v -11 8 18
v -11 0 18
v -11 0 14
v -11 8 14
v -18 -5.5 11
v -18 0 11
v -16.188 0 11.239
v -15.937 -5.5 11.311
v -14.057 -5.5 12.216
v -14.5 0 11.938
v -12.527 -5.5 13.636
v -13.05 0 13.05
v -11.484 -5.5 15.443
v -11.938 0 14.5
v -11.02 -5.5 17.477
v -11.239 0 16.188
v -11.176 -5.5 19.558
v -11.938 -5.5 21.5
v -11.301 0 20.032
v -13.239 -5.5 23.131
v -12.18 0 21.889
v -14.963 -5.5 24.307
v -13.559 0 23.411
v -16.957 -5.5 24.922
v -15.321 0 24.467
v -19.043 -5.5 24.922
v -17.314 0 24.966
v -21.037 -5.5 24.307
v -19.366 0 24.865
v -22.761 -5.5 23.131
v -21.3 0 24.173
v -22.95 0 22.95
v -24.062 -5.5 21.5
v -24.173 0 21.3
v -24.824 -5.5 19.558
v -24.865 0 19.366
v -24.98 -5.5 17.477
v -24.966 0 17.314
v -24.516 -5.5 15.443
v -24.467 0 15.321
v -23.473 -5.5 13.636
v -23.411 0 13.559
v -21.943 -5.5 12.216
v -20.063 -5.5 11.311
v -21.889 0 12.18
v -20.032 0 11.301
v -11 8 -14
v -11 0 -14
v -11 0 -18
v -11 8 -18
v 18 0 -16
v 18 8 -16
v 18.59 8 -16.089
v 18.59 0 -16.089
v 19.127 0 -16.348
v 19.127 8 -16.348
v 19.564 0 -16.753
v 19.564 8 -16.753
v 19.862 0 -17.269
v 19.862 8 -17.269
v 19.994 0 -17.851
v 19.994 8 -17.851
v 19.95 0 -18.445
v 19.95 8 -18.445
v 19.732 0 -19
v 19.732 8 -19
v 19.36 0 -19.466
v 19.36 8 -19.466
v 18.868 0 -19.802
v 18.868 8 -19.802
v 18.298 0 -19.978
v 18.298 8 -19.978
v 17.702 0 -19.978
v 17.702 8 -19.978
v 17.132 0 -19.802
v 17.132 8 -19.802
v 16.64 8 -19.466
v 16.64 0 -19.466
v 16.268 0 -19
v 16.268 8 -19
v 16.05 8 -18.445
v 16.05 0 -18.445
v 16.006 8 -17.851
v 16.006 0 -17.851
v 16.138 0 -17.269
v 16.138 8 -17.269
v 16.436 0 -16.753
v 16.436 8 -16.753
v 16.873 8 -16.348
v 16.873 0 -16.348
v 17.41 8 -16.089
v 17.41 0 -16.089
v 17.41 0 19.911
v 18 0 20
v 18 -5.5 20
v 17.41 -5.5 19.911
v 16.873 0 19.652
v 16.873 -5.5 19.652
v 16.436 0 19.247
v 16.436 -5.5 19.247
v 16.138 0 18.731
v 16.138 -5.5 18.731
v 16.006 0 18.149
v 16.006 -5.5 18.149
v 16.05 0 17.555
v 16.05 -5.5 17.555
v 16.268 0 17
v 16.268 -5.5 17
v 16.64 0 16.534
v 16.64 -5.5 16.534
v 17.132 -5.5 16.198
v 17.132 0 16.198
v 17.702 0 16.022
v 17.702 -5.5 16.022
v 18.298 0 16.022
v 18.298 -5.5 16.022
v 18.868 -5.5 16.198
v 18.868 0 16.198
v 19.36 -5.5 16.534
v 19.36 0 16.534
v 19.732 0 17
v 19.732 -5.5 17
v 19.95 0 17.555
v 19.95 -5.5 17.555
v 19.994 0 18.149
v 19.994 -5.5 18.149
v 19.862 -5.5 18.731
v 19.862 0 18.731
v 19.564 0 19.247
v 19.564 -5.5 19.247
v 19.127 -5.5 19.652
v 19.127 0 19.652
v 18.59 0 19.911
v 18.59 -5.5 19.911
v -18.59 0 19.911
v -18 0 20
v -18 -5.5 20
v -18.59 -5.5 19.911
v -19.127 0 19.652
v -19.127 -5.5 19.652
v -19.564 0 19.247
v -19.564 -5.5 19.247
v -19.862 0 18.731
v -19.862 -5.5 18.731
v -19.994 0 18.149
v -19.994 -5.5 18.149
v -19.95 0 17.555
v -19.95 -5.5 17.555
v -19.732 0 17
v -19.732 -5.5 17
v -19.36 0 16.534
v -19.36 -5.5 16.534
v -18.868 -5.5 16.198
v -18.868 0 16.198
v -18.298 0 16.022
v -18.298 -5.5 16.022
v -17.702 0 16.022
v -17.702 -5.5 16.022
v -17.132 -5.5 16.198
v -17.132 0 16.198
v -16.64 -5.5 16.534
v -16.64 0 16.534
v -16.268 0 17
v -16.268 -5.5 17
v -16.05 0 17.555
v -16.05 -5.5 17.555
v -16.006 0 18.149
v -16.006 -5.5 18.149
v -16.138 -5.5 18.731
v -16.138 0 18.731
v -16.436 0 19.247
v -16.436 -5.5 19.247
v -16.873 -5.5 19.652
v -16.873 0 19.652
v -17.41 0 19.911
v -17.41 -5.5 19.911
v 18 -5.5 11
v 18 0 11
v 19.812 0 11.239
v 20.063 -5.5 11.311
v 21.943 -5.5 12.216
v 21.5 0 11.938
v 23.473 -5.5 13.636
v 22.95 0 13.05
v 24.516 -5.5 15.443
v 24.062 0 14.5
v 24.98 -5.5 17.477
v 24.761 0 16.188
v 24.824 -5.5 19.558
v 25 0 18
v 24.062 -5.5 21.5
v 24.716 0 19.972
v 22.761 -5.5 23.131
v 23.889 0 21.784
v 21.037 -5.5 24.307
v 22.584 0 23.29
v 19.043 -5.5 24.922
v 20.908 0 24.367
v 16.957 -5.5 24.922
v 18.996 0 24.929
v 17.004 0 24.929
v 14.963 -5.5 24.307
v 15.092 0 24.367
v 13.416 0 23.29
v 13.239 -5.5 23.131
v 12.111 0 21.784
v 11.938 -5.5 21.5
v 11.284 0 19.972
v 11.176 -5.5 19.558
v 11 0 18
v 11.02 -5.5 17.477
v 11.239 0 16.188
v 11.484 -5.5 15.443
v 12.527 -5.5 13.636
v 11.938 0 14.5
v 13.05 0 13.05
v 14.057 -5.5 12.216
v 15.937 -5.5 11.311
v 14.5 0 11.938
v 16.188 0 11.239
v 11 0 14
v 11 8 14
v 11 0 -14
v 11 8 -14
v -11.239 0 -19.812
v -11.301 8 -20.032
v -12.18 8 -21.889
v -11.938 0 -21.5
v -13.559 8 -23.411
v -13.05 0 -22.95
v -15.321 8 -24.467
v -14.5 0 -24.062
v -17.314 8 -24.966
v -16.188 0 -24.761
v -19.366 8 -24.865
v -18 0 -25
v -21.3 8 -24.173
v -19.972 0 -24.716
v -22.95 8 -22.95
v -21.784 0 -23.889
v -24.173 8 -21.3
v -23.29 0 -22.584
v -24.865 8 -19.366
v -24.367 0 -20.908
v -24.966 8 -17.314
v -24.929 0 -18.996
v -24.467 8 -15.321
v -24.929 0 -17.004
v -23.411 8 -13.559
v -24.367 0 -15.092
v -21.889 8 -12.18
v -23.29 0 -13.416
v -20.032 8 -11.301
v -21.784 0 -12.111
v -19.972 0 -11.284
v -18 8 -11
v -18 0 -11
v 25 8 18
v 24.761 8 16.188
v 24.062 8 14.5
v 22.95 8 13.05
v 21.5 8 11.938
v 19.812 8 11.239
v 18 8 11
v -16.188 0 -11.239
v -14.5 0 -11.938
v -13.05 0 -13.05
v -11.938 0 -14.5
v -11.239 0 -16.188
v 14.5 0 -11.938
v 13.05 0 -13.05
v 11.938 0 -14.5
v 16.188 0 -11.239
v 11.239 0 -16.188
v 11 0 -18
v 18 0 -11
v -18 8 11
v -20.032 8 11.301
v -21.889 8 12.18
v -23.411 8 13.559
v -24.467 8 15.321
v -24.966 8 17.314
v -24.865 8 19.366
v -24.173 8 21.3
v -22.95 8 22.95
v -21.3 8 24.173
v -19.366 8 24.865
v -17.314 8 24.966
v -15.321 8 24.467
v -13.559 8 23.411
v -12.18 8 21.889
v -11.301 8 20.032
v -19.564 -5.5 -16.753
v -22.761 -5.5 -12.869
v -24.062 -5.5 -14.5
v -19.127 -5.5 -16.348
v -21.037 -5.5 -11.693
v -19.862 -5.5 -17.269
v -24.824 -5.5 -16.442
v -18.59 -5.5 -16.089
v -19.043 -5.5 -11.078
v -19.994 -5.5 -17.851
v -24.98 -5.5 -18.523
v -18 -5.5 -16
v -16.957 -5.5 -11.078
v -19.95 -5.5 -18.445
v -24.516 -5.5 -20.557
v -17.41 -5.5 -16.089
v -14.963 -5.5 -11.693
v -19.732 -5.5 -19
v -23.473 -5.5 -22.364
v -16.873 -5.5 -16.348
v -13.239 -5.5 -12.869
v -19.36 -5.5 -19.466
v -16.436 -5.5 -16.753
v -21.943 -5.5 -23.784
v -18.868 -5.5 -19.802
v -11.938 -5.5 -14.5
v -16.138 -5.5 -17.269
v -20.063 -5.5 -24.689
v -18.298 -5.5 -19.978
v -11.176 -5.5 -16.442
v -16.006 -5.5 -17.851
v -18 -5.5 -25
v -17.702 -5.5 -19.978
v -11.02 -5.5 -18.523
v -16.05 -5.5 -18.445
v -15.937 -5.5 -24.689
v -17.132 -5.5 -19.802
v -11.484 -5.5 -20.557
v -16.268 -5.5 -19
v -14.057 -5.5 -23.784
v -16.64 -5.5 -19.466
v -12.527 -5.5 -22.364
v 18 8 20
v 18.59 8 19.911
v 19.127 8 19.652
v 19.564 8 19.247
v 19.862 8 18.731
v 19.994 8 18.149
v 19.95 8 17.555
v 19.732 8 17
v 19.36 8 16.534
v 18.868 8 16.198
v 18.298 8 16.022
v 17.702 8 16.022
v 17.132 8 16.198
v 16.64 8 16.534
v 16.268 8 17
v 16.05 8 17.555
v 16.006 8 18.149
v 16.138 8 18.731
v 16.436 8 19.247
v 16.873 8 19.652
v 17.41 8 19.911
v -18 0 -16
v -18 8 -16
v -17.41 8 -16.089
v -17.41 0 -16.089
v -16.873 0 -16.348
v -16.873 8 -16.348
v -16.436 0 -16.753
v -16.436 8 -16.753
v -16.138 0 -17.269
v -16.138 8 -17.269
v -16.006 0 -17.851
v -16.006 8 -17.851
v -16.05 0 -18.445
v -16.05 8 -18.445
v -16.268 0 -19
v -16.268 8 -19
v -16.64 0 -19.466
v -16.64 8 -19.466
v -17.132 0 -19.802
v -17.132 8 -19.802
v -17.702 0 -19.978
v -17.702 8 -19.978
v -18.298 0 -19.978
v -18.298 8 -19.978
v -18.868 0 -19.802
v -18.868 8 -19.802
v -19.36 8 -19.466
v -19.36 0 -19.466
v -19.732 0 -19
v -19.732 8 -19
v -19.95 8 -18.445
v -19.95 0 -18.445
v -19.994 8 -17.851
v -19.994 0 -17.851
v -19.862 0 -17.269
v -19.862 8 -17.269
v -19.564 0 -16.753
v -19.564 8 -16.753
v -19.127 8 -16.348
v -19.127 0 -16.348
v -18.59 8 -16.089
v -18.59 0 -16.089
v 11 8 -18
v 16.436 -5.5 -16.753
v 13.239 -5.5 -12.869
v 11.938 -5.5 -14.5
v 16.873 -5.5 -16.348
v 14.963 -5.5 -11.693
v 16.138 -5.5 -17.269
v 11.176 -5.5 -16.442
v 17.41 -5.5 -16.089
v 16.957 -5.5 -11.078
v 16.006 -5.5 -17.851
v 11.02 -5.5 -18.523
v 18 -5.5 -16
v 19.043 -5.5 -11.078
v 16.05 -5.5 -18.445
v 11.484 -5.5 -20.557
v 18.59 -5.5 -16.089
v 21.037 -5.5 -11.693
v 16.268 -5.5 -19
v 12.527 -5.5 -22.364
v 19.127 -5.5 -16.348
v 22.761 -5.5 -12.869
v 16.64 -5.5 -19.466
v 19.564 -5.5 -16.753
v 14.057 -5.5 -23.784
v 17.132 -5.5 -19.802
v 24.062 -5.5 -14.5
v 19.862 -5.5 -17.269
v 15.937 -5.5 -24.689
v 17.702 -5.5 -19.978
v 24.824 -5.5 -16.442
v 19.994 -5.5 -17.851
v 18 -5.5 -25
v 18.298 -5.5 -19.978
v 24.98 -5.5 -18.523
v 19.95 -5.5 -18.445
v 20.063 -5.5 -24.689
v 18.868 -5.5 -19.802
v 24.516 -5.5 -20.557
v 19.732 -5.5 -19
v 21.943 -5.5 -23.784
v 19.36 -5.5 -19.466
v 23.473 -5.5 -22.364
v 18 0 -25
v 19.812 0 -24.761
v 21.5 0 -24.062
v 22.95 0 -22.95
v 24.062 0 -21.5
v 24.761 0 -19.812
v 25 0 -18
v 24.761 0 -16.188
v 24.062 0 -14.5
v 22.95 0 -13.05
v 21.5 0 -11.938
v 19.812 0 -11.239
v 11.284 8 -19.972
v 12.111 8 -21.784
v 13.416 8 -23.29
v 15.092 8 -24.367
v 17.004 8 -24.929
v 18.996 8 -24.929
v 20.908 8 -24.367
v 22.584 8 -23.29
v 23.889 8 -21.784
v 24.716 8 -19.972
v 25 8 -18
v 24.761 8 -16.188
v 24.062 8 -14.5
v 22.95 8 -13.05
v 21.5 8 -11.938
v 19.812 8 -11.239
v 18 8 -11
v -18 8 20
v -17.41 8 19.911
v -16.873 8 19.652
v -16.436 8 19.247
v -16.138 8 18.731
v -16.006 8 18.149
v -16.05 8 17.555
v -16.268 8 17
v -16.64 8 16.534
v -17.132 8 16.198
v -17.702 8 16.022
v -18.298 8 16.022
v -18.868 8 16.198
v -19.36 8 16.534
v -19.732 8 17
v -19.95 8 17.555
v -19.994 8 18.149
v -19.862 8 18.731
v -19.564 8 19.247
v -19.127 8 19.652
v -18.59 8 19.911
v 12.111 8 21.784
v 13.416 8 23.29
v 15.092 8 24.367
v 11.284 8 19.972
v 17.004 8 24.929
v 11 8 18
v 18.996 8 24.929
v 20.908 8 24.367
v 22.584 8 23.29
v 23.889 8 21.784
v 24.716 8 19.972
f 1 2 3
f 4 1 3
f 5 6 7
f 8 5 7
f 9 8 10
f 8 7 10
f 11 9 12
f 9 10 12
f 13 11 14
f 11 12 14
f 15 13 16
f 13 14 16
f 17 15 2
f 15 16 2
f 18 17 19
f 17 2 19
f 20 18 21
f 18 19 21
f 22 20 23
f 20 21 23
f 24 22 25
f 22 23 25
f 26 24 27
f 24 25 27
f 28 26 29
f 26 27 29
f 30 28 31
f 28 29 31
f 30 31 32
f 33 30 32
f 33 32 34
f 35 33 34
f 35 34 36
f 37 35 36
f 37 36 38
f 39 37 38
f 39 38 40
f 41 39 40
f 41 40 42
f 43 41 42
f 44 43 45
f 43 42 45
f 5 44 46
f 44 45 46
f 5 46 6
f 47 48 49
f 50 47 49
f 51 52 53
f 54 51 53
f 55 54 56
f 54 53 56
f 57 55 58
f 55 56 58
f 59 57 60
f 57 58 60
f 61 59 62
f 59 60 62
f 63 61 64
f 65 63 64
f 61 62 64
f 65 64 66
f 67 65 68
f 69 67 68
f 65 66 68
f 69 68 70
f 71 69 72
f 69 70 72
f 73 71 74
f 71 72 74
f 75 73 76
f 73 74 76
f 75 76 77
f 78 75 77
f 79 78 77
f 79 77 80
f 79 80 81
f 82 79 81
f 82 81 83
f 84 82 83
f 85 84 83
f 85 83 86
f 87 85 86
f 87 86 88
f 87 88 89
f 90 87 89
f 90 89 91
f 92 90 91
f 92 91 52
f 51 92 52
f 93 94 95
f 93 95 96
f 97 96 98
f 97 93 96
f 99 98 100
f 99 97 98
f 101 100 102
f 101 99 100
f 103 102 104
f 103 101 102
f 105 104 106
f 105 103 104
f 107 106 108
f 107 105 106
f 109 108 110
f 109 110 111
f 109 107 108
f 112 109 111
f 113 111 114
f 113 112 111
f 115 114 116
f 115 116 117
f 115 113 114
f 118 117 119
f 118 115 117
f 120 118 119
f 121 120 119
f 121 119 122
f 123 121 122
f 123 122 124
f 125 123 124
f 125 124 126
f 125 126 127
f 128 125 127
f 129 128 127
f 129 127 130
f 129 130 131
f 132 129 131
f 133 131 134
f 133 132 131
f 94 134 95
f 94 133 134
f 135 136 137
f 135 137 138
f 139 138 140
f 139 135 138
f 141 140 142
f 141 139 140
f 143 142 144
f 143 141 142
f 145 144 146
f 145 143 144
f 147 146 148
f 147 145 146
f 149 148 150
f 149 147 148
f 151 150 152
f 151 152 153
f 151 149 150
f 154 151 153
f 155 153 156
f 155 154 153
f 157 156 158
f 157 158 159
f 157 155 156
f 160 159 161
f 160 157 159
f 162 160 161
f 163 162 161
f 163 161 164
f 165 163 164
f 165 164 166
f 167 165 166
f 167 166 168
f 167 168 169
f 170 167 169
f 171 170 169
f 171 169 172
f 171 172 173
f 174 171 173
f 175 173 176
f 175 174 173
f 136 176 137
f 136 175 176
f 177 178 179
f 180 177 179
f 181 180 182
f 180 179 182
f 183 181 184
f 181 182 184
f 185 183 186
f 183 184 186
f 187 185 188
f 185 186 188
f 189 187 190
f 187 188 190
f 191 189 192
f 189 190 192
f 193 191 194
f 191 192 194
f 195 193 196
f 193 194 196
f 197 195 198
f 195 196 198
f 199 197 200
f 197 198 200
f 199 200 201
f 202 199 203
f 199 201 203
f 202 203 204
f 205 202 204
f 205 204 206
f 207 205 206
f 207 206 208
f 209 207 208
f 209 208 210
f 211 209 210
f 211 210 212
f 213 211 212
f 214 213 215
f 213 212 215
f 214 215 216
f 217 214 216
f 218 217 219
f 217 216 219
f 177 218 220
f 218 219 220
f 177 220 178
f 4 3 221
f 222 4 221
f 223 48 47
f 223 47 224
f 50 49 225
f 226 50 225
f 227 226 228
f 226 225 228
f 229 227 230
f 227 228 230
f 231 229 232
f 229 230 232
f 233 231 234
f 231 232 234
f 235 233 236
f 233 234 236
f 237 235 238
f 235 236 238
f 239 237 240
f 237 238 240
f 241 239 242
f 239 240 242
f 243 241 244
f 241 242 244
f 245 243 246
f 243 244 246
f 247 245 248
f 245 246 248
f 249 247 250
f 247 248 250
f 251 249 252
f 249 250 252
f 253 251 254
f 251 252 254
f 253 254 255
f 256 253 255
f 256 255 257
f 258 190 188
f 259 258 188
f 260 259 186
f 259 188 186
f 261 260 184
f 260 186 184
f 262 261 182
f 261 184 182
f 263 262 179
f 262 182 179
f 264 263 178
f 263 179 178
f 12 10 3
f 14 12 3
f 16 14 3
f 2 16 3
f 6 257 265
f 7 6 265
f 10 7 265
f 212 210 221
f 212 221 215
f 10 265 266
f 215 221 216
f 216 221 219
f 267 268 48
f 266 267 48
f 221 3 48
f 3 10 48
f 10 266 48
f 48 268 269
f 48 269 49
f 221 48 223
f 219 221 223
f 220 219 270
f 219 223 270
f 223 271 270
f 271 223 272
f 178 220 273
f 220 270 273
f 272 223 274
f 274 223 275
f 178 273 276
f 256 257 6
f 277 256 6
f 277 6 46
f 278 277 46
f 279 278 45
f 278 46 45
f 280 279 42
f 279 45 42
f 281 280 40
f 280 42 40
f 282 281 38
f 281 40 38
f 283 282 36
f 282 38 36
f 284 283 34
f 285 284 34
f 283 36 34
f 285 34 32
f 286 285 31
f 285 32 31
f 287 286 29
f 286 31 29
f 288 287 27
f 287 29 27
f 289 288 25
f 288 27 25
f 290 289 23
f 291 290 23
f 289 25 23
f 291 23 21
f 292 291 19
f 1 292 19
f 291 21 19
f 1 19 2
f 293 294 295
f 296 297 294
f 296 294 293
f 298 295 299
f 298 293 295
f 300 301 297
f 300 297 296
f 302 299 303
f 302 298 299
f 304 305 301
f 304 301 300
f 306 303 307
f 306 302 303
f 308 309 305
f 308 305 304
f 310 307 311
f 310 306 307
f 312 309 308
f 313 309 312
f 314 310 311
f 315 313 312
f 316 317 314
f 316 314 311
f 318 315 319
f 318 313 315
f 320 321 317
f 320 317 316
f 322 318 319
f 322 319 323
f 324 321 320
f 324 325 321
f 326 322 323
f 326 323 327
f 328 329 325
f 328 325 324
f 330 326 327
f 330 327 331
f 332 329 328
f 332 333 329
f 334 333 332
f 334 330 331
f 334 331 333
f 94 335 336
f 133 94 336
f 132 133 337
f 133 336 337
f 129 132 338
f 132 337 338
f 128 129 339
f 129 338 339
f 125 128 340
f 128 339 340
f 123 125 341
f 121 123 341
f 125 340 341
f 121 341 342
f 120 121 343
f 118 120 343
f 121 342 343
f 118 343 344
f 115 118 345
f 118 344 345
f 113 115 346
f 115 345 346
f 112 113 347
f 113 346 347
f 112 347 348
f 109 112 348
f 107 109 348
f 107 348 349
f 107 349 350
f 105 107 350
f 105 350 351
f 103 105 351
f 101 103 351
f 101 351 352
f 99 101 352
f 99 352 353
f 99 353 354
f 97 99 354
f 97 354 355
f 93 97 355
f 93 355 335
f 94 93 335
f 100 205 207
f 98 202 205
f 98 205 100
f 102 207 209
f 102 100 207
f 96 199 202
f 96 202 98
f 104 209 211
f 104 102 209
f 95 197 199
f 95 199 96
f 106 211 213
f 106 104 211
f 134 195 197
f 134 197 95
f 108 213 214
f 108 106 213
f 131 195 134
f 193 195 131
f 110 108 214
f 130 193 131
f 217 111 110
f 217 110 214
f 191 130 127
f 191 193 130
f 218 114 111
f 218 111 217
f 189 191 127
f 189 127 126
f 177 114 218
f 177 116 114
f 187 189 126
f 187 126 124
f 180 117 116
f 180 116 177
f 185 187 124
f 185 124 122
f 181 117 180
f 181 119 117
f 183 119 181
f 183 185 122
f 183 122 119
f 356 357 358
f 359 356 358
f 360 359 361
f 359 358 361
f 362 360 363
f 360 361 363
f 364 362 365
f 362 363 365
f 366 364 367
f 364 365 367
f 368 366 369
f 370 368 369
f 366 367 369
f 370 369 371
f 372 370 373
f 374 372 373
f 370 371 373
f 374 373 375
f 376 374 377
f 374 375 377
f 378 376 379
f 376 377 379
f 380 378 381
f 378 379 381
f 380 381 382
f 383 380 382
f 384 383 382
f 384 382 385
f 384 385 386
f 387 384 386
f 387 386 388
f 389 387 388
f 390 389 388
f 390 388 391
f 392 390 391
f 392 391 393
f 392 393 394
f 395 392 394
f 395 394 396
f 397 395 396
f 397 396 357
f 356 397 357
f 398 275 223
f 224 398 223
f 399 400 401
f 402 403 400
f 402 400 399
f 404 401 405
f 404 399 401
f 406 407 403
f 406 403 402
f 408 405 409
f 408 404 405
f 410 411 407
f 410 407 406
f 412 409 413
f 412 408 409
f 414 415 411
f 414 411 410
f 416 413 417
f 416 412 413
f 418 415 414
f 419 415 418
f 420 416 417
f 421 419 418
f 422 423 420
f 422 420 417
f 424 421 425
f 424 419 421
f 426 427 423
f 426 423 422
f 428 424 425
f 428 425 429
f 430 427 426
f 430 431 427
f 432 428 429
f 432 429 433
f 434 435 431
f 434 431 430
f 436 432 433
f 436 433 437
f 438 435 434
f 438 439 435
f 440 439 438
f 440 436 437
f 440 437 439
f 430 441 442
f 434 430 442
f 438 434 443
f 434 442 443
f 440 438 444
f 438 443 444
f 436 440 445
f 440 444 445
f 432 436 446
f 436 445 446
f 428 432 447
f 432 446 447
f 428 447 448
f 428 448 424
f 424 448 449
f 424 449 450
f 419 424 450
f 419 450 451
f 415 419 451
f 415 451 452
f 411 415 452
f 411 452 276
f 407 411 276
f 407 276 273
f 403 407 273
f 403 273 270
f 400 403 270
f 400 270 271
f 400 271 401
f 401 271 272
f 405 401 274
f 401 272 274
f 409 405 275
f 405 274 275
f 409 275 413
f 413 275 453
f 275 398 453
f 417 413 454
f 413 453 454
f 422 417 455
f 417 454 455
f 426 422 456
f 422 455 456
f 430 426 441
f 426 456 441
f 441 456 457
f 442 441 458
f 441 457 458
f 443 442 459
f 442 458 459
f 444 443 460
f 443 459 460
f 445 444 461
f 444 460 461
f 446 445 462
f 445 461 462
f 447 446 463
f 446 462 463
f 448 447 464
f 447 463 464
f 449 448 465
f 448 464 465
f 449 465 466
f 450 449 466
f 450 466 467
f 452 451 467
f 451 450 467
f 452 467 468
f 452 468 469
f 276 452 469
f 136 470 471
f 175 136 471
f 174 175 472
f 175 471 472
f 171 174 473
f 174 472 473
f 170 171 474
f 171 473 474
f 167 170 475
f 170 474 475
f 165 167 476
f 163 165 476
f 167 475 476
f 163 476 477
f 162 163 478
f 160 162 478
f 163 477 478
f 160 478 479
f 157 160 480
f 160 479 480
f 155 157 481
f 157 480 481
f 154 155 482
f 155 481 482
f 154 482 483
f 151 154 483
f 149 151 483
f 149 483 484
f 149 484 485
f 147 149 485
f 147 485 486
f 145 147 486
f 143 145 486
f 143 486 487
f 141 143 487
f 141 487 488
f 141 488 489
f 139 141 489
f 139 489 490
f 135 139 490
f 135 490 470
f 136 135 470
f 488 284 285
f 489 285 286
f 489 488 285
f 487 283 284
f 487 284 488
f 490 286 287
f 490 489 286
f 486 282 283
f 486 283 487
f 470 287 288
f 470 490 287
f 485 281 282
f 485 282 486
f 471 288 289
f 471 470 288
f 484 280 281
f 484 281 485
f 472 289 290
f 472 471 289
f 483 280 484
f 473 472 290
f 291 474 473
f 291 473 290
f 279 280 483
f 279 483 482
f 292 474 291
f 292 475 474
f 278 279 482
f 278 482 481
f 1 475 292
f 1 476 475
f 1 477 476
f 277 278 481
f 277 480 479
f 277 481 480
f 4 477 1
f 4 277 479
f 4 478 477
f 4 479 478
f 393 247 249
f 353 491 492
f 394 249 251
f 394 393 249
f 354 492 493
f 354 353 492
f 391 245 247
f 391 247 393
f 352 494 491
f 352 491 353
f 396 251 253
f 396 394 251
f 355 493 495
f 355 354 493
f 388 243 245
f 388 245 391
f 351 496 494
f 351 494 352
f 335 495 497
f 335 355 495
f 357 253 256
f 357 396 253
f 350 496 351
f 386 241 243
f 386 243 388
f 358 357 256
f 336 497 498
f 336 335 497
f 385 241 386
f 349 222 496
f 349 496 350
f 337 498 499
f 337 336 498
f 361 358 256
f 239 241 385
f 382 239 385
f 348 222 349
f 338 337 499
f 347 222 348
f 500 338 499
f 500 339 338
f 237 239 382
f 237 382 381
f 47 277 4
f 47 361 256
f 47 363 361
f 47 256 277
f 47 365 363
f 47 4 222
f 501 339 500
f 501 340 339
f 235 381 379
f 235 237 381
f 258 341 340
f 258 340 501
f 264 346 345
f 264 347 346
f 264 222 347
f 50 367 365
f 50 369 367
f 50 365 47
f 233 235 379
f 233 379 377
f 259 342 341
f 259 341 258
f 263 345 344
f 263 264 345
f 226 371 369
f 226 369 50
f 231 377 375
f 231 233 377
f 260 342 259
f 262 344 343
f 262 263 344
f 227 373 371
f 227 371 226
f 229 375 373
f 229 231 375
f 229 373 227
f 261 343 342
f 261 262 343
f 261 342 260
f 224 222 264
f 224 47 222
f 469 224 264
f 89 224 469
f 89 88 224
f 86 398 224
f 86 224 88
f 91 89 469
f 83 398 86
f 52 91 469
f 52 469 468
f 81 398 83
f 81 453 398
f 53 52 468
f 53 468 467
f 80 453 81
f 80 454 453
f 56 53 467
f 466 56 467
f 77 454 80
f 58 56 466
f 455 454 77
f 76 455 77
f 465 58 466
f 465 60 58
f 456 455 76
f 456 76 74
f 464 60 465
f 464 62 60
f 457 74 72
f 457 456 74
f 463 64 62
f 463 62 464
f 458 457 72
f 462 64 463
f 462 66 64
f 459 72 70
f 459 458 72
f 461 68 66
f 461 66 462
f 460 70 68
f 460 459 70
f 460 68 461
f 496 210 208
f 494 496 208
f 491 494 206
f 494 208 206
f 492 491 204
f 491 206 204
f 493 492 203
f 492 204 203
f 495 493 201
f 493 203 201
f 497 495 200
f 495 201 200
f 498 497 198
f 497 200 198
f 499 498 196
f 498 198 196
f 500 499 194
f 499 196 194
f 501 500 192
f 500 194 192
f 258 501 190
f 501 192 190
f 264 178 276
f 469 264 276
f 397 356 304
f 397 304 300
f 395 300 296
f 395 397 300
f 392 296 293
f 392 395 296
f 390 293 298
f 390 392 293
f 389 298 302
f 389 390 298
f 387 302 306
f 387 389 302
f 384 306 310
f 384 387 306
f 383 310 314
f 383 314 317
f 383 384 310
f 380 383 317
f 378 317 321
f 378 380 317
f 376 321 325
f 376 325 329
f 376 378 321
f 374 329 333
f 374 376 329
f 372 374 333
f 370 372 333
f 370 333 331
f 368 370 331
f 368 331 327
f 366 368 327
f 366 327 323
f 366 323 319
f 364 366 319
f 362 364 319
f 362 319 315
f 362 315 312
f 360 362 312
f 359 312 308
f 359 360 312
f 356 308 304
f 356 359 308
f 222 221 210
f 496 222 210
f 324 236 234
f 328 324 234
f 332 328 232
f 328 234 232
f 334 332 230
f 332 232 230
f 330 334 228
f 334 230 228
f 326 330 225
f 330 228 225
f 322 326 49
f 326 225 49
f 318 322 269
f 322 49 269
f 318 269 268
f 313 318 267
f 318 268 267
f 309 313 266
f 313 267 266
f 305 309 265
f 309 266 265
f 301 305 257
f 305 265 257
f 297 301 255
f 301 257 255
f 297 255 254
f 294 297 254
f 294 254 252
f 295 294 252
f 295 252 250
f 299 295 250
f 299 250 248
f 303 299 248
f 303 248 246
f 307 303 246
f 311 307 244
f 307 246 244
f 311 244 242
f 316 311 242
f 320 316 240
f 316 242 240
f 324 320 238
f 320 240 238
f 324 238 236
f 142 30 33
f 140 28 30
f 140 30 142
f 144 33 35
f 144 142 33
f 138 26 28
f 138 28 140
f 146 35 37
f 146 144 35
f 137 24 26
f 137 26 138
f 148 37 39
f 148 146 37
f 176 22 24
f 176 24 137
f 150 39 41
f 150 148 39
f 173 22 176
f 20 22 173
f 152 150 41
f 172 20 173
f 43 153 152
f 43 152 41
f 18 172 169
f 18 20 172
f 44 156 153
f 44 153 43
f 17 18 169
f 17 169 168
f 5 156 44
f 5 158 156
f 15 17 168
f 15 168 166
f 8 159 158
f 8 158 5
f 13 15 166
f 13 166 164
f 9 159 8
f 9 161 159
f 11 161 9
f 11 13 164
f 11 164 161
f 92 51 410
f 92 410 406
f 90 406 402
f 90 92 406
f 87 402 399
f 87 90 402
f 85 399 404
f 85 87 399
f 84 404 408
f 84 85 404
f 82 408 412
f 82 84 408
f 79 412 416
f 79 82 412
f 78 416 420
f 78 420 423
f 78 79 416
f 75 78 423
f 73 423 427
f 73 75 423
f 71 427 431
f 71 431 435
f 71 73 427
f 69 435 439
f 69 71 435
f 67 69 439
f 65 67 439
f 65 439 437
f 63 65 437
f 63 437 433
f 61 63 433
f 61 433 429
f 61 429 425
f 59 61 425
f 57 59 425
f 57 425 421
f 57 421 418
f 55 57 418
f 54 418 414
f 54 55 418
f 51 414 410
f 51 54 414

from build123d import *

# Parameters (mm, degrees)
SKETCH1_W           = 22
SKETCH1_H           = 28
BOSS_EXTRUDE1_DEPTH = 8
SKETCH2_R           = 2
CUT_EXTRUDE1_DEPTH  = 37.249137921
SKETCH5_R           = 7
SKETCH5_R_2         = 2
BOSS_EXTRUDE3_DEPTH = 5.5


with BuildPart() as part:
    # Sketch1 → Boss-Extrude1 (new body)
    with BuildSketch(Plane(origin=(0, 0, 0), x_dir=(1, 0, 0), z_dir=(0, 1, 0))):
        with BuildLine():
            ThreePointArc((-18, 11), (-13.050252532, 13.050252532), (-11, 18))
            Line((-11, 18), (-18, 18))
            Line((-18, 18), (-18, 11))
        make_face()
        with BuildLine():
            Line((-18, 18), (-11, 18))
            ThreePointArc((-11, 18), (-22.949747468, 22.949747468), (-18, 11))
            Line((-18, 11), (-18, 18))
        make_face()
        with BuildLine():
            Line((-11, -18), (-11, -14))
            Line((-11, -14), (-11, 14))
            Line((-11, 14), (-11, 18))
            ThreePointArc((-11, 18), (-13.050252532, 13.050252532), (-18, 11))
            Line((-18, 11), (-18, -11))
            ThreePointArc((-18, -11), (-13.050252532, -13.050252532), (-11, -18))
        make_face()
        with BuildLine():
            ThreePointArc((-18, -11), (-22.949747468, -22.949747468), (-11, -18))
            Line((-11, -18), (-18, -18))
            Line((-18, -18), (-18, -11))
        make_face()
        with BuildLine():
            Line((-18, -18), (-11, -18))
            ThreePointArc((-11, -18), (-13.050252532, -13.050252532), (-18, -11))
            Line((-18, -11), (-18, -18))
        make_face()
        Rectangle(SKETCH1_W, SKETCH1_H)
        with BuildLine():
            ThreePointArc((18, -11), (13.050252532, -13.050252532), (11, -18))
            Line((11, -18), (18, -18))
            Line((18, -18), (18, -11))
        make_face()
        with BuildLine():
            Line((18, -18), (11, -18))
            ThreePointArc((11, -18), (18, -25), (25, -18))
            ThreePointArc((25, -18), (22.949747468, -13.050252532), (18, -11))
            Line((18, -11), (18, -18))
        make_face()
        with BuildLine():
            Line((11, 14), (11, -14))
            Line((11, -14), (11, -18))
            ThreePointArc((11, -18), (13.050252532, -13.050252532), (18, -11))
            Line((18, -11), (18, 11))
            ThreePointArc((18, 11), (13.050252532, 13.050252532), (11, 18))
            Line((11, 18), (11, 14))
        make_face()
        with BuildLine():
            ThreePointArc((25, 18), (18, 25), (11, 18))
            Line((11, 18), (18, 18))
            Line((18, 18), (18, 11))
            ThreePointArc((18, 11), (22.949747468, 13.050252532), (25, 18))
        make_face()
        with BuildLine():
            Line((18, 18), (11, 18))
            ThreePointArc((11, 18), (13.050252532, 13.050252532), (18, 11))
            Line((18, 11), (18, 18))
        make_face()
    extrude(amount=BOSS_EXTRUDE1_DEPTH)

    # Sketch2 → Cut-Extrude1 (cut, through all)
    with BuildSketch(Plane(origin=(0, 8, 0), x_dir=(1, 0, 0), z_dir=(0, 1, 0))):
        with Locations(Location((-18, 18, 0), (0, 0, 270))):
            Circle(SKETCH2_R)
        with Locations(Location((-18, -18, 0), (0, 0, 270))):
            Circle(SKETCH2_R)
        with Locations(Location((18, -18, 0), (0, 0, 270))):
            Circle(SKETCH2_R)
        with Locations(Location((18, 18, 0), (0, 0, 270))):
            Circle(SKETCH2_R)
    extrude(amount=-CUT_EXTRUDE1_DEPTH, mode=Mode.SUBTRACT)

    # Sketch5 → Boss-Extrude3 (add)
    # profile 1 of 4: a face of its own
    with BuildSketch(Plane.XZ):
        with Locations(Location((-18, 18, 0), (0, 0, 270))):
            Circle(SKETCH5_R)
        with Locations(Location((-18, 18, 0), (0, 0, 90))):
            Circle(SKETCH5_R_2, mode=Mode.SUBTRACT)
    # profile 2 of 4: a face of its own
    with BuildSketch(Plane.XZ):
        with Locations(Location((18, 18, 0), (0, 0, 270))):
            Circle(SKETCH5_R)
        with Locations(Location((18, 18, 0), (0, 0, 90))):
            Circle(SKETCH5_R_2, mode=Mode.SUBTRACT)
    # profile 3 of 4: a face of its own
    with BuildSketch(Plane.XZ):
        with Locations(Location((18, -18, 0), (0, 0, 270))):
            Circle(SKETCH5_R)
        with Locations(Location((18, -18, 0), (0, 0, 90))):
            Circle(SKETCH5_R_2, mode=Mode.SUBTRACT)
    # profile 4 of 4: a face of its own
    with BuildSketch(Plane.XZ):
        with Locations(Location((-18, -18, 0), (0, 0, 270))):
            Circle(SKETCH5_R)
        with Locations(Location((-18, -18, 0), (0, 0, 90))):
            Circle(SKETCH5_R_2, mode=Mode.SUBTRACT)
    extrude(amount=BOSS_EXTRUDE3_DEPTH)


solid = part.part
